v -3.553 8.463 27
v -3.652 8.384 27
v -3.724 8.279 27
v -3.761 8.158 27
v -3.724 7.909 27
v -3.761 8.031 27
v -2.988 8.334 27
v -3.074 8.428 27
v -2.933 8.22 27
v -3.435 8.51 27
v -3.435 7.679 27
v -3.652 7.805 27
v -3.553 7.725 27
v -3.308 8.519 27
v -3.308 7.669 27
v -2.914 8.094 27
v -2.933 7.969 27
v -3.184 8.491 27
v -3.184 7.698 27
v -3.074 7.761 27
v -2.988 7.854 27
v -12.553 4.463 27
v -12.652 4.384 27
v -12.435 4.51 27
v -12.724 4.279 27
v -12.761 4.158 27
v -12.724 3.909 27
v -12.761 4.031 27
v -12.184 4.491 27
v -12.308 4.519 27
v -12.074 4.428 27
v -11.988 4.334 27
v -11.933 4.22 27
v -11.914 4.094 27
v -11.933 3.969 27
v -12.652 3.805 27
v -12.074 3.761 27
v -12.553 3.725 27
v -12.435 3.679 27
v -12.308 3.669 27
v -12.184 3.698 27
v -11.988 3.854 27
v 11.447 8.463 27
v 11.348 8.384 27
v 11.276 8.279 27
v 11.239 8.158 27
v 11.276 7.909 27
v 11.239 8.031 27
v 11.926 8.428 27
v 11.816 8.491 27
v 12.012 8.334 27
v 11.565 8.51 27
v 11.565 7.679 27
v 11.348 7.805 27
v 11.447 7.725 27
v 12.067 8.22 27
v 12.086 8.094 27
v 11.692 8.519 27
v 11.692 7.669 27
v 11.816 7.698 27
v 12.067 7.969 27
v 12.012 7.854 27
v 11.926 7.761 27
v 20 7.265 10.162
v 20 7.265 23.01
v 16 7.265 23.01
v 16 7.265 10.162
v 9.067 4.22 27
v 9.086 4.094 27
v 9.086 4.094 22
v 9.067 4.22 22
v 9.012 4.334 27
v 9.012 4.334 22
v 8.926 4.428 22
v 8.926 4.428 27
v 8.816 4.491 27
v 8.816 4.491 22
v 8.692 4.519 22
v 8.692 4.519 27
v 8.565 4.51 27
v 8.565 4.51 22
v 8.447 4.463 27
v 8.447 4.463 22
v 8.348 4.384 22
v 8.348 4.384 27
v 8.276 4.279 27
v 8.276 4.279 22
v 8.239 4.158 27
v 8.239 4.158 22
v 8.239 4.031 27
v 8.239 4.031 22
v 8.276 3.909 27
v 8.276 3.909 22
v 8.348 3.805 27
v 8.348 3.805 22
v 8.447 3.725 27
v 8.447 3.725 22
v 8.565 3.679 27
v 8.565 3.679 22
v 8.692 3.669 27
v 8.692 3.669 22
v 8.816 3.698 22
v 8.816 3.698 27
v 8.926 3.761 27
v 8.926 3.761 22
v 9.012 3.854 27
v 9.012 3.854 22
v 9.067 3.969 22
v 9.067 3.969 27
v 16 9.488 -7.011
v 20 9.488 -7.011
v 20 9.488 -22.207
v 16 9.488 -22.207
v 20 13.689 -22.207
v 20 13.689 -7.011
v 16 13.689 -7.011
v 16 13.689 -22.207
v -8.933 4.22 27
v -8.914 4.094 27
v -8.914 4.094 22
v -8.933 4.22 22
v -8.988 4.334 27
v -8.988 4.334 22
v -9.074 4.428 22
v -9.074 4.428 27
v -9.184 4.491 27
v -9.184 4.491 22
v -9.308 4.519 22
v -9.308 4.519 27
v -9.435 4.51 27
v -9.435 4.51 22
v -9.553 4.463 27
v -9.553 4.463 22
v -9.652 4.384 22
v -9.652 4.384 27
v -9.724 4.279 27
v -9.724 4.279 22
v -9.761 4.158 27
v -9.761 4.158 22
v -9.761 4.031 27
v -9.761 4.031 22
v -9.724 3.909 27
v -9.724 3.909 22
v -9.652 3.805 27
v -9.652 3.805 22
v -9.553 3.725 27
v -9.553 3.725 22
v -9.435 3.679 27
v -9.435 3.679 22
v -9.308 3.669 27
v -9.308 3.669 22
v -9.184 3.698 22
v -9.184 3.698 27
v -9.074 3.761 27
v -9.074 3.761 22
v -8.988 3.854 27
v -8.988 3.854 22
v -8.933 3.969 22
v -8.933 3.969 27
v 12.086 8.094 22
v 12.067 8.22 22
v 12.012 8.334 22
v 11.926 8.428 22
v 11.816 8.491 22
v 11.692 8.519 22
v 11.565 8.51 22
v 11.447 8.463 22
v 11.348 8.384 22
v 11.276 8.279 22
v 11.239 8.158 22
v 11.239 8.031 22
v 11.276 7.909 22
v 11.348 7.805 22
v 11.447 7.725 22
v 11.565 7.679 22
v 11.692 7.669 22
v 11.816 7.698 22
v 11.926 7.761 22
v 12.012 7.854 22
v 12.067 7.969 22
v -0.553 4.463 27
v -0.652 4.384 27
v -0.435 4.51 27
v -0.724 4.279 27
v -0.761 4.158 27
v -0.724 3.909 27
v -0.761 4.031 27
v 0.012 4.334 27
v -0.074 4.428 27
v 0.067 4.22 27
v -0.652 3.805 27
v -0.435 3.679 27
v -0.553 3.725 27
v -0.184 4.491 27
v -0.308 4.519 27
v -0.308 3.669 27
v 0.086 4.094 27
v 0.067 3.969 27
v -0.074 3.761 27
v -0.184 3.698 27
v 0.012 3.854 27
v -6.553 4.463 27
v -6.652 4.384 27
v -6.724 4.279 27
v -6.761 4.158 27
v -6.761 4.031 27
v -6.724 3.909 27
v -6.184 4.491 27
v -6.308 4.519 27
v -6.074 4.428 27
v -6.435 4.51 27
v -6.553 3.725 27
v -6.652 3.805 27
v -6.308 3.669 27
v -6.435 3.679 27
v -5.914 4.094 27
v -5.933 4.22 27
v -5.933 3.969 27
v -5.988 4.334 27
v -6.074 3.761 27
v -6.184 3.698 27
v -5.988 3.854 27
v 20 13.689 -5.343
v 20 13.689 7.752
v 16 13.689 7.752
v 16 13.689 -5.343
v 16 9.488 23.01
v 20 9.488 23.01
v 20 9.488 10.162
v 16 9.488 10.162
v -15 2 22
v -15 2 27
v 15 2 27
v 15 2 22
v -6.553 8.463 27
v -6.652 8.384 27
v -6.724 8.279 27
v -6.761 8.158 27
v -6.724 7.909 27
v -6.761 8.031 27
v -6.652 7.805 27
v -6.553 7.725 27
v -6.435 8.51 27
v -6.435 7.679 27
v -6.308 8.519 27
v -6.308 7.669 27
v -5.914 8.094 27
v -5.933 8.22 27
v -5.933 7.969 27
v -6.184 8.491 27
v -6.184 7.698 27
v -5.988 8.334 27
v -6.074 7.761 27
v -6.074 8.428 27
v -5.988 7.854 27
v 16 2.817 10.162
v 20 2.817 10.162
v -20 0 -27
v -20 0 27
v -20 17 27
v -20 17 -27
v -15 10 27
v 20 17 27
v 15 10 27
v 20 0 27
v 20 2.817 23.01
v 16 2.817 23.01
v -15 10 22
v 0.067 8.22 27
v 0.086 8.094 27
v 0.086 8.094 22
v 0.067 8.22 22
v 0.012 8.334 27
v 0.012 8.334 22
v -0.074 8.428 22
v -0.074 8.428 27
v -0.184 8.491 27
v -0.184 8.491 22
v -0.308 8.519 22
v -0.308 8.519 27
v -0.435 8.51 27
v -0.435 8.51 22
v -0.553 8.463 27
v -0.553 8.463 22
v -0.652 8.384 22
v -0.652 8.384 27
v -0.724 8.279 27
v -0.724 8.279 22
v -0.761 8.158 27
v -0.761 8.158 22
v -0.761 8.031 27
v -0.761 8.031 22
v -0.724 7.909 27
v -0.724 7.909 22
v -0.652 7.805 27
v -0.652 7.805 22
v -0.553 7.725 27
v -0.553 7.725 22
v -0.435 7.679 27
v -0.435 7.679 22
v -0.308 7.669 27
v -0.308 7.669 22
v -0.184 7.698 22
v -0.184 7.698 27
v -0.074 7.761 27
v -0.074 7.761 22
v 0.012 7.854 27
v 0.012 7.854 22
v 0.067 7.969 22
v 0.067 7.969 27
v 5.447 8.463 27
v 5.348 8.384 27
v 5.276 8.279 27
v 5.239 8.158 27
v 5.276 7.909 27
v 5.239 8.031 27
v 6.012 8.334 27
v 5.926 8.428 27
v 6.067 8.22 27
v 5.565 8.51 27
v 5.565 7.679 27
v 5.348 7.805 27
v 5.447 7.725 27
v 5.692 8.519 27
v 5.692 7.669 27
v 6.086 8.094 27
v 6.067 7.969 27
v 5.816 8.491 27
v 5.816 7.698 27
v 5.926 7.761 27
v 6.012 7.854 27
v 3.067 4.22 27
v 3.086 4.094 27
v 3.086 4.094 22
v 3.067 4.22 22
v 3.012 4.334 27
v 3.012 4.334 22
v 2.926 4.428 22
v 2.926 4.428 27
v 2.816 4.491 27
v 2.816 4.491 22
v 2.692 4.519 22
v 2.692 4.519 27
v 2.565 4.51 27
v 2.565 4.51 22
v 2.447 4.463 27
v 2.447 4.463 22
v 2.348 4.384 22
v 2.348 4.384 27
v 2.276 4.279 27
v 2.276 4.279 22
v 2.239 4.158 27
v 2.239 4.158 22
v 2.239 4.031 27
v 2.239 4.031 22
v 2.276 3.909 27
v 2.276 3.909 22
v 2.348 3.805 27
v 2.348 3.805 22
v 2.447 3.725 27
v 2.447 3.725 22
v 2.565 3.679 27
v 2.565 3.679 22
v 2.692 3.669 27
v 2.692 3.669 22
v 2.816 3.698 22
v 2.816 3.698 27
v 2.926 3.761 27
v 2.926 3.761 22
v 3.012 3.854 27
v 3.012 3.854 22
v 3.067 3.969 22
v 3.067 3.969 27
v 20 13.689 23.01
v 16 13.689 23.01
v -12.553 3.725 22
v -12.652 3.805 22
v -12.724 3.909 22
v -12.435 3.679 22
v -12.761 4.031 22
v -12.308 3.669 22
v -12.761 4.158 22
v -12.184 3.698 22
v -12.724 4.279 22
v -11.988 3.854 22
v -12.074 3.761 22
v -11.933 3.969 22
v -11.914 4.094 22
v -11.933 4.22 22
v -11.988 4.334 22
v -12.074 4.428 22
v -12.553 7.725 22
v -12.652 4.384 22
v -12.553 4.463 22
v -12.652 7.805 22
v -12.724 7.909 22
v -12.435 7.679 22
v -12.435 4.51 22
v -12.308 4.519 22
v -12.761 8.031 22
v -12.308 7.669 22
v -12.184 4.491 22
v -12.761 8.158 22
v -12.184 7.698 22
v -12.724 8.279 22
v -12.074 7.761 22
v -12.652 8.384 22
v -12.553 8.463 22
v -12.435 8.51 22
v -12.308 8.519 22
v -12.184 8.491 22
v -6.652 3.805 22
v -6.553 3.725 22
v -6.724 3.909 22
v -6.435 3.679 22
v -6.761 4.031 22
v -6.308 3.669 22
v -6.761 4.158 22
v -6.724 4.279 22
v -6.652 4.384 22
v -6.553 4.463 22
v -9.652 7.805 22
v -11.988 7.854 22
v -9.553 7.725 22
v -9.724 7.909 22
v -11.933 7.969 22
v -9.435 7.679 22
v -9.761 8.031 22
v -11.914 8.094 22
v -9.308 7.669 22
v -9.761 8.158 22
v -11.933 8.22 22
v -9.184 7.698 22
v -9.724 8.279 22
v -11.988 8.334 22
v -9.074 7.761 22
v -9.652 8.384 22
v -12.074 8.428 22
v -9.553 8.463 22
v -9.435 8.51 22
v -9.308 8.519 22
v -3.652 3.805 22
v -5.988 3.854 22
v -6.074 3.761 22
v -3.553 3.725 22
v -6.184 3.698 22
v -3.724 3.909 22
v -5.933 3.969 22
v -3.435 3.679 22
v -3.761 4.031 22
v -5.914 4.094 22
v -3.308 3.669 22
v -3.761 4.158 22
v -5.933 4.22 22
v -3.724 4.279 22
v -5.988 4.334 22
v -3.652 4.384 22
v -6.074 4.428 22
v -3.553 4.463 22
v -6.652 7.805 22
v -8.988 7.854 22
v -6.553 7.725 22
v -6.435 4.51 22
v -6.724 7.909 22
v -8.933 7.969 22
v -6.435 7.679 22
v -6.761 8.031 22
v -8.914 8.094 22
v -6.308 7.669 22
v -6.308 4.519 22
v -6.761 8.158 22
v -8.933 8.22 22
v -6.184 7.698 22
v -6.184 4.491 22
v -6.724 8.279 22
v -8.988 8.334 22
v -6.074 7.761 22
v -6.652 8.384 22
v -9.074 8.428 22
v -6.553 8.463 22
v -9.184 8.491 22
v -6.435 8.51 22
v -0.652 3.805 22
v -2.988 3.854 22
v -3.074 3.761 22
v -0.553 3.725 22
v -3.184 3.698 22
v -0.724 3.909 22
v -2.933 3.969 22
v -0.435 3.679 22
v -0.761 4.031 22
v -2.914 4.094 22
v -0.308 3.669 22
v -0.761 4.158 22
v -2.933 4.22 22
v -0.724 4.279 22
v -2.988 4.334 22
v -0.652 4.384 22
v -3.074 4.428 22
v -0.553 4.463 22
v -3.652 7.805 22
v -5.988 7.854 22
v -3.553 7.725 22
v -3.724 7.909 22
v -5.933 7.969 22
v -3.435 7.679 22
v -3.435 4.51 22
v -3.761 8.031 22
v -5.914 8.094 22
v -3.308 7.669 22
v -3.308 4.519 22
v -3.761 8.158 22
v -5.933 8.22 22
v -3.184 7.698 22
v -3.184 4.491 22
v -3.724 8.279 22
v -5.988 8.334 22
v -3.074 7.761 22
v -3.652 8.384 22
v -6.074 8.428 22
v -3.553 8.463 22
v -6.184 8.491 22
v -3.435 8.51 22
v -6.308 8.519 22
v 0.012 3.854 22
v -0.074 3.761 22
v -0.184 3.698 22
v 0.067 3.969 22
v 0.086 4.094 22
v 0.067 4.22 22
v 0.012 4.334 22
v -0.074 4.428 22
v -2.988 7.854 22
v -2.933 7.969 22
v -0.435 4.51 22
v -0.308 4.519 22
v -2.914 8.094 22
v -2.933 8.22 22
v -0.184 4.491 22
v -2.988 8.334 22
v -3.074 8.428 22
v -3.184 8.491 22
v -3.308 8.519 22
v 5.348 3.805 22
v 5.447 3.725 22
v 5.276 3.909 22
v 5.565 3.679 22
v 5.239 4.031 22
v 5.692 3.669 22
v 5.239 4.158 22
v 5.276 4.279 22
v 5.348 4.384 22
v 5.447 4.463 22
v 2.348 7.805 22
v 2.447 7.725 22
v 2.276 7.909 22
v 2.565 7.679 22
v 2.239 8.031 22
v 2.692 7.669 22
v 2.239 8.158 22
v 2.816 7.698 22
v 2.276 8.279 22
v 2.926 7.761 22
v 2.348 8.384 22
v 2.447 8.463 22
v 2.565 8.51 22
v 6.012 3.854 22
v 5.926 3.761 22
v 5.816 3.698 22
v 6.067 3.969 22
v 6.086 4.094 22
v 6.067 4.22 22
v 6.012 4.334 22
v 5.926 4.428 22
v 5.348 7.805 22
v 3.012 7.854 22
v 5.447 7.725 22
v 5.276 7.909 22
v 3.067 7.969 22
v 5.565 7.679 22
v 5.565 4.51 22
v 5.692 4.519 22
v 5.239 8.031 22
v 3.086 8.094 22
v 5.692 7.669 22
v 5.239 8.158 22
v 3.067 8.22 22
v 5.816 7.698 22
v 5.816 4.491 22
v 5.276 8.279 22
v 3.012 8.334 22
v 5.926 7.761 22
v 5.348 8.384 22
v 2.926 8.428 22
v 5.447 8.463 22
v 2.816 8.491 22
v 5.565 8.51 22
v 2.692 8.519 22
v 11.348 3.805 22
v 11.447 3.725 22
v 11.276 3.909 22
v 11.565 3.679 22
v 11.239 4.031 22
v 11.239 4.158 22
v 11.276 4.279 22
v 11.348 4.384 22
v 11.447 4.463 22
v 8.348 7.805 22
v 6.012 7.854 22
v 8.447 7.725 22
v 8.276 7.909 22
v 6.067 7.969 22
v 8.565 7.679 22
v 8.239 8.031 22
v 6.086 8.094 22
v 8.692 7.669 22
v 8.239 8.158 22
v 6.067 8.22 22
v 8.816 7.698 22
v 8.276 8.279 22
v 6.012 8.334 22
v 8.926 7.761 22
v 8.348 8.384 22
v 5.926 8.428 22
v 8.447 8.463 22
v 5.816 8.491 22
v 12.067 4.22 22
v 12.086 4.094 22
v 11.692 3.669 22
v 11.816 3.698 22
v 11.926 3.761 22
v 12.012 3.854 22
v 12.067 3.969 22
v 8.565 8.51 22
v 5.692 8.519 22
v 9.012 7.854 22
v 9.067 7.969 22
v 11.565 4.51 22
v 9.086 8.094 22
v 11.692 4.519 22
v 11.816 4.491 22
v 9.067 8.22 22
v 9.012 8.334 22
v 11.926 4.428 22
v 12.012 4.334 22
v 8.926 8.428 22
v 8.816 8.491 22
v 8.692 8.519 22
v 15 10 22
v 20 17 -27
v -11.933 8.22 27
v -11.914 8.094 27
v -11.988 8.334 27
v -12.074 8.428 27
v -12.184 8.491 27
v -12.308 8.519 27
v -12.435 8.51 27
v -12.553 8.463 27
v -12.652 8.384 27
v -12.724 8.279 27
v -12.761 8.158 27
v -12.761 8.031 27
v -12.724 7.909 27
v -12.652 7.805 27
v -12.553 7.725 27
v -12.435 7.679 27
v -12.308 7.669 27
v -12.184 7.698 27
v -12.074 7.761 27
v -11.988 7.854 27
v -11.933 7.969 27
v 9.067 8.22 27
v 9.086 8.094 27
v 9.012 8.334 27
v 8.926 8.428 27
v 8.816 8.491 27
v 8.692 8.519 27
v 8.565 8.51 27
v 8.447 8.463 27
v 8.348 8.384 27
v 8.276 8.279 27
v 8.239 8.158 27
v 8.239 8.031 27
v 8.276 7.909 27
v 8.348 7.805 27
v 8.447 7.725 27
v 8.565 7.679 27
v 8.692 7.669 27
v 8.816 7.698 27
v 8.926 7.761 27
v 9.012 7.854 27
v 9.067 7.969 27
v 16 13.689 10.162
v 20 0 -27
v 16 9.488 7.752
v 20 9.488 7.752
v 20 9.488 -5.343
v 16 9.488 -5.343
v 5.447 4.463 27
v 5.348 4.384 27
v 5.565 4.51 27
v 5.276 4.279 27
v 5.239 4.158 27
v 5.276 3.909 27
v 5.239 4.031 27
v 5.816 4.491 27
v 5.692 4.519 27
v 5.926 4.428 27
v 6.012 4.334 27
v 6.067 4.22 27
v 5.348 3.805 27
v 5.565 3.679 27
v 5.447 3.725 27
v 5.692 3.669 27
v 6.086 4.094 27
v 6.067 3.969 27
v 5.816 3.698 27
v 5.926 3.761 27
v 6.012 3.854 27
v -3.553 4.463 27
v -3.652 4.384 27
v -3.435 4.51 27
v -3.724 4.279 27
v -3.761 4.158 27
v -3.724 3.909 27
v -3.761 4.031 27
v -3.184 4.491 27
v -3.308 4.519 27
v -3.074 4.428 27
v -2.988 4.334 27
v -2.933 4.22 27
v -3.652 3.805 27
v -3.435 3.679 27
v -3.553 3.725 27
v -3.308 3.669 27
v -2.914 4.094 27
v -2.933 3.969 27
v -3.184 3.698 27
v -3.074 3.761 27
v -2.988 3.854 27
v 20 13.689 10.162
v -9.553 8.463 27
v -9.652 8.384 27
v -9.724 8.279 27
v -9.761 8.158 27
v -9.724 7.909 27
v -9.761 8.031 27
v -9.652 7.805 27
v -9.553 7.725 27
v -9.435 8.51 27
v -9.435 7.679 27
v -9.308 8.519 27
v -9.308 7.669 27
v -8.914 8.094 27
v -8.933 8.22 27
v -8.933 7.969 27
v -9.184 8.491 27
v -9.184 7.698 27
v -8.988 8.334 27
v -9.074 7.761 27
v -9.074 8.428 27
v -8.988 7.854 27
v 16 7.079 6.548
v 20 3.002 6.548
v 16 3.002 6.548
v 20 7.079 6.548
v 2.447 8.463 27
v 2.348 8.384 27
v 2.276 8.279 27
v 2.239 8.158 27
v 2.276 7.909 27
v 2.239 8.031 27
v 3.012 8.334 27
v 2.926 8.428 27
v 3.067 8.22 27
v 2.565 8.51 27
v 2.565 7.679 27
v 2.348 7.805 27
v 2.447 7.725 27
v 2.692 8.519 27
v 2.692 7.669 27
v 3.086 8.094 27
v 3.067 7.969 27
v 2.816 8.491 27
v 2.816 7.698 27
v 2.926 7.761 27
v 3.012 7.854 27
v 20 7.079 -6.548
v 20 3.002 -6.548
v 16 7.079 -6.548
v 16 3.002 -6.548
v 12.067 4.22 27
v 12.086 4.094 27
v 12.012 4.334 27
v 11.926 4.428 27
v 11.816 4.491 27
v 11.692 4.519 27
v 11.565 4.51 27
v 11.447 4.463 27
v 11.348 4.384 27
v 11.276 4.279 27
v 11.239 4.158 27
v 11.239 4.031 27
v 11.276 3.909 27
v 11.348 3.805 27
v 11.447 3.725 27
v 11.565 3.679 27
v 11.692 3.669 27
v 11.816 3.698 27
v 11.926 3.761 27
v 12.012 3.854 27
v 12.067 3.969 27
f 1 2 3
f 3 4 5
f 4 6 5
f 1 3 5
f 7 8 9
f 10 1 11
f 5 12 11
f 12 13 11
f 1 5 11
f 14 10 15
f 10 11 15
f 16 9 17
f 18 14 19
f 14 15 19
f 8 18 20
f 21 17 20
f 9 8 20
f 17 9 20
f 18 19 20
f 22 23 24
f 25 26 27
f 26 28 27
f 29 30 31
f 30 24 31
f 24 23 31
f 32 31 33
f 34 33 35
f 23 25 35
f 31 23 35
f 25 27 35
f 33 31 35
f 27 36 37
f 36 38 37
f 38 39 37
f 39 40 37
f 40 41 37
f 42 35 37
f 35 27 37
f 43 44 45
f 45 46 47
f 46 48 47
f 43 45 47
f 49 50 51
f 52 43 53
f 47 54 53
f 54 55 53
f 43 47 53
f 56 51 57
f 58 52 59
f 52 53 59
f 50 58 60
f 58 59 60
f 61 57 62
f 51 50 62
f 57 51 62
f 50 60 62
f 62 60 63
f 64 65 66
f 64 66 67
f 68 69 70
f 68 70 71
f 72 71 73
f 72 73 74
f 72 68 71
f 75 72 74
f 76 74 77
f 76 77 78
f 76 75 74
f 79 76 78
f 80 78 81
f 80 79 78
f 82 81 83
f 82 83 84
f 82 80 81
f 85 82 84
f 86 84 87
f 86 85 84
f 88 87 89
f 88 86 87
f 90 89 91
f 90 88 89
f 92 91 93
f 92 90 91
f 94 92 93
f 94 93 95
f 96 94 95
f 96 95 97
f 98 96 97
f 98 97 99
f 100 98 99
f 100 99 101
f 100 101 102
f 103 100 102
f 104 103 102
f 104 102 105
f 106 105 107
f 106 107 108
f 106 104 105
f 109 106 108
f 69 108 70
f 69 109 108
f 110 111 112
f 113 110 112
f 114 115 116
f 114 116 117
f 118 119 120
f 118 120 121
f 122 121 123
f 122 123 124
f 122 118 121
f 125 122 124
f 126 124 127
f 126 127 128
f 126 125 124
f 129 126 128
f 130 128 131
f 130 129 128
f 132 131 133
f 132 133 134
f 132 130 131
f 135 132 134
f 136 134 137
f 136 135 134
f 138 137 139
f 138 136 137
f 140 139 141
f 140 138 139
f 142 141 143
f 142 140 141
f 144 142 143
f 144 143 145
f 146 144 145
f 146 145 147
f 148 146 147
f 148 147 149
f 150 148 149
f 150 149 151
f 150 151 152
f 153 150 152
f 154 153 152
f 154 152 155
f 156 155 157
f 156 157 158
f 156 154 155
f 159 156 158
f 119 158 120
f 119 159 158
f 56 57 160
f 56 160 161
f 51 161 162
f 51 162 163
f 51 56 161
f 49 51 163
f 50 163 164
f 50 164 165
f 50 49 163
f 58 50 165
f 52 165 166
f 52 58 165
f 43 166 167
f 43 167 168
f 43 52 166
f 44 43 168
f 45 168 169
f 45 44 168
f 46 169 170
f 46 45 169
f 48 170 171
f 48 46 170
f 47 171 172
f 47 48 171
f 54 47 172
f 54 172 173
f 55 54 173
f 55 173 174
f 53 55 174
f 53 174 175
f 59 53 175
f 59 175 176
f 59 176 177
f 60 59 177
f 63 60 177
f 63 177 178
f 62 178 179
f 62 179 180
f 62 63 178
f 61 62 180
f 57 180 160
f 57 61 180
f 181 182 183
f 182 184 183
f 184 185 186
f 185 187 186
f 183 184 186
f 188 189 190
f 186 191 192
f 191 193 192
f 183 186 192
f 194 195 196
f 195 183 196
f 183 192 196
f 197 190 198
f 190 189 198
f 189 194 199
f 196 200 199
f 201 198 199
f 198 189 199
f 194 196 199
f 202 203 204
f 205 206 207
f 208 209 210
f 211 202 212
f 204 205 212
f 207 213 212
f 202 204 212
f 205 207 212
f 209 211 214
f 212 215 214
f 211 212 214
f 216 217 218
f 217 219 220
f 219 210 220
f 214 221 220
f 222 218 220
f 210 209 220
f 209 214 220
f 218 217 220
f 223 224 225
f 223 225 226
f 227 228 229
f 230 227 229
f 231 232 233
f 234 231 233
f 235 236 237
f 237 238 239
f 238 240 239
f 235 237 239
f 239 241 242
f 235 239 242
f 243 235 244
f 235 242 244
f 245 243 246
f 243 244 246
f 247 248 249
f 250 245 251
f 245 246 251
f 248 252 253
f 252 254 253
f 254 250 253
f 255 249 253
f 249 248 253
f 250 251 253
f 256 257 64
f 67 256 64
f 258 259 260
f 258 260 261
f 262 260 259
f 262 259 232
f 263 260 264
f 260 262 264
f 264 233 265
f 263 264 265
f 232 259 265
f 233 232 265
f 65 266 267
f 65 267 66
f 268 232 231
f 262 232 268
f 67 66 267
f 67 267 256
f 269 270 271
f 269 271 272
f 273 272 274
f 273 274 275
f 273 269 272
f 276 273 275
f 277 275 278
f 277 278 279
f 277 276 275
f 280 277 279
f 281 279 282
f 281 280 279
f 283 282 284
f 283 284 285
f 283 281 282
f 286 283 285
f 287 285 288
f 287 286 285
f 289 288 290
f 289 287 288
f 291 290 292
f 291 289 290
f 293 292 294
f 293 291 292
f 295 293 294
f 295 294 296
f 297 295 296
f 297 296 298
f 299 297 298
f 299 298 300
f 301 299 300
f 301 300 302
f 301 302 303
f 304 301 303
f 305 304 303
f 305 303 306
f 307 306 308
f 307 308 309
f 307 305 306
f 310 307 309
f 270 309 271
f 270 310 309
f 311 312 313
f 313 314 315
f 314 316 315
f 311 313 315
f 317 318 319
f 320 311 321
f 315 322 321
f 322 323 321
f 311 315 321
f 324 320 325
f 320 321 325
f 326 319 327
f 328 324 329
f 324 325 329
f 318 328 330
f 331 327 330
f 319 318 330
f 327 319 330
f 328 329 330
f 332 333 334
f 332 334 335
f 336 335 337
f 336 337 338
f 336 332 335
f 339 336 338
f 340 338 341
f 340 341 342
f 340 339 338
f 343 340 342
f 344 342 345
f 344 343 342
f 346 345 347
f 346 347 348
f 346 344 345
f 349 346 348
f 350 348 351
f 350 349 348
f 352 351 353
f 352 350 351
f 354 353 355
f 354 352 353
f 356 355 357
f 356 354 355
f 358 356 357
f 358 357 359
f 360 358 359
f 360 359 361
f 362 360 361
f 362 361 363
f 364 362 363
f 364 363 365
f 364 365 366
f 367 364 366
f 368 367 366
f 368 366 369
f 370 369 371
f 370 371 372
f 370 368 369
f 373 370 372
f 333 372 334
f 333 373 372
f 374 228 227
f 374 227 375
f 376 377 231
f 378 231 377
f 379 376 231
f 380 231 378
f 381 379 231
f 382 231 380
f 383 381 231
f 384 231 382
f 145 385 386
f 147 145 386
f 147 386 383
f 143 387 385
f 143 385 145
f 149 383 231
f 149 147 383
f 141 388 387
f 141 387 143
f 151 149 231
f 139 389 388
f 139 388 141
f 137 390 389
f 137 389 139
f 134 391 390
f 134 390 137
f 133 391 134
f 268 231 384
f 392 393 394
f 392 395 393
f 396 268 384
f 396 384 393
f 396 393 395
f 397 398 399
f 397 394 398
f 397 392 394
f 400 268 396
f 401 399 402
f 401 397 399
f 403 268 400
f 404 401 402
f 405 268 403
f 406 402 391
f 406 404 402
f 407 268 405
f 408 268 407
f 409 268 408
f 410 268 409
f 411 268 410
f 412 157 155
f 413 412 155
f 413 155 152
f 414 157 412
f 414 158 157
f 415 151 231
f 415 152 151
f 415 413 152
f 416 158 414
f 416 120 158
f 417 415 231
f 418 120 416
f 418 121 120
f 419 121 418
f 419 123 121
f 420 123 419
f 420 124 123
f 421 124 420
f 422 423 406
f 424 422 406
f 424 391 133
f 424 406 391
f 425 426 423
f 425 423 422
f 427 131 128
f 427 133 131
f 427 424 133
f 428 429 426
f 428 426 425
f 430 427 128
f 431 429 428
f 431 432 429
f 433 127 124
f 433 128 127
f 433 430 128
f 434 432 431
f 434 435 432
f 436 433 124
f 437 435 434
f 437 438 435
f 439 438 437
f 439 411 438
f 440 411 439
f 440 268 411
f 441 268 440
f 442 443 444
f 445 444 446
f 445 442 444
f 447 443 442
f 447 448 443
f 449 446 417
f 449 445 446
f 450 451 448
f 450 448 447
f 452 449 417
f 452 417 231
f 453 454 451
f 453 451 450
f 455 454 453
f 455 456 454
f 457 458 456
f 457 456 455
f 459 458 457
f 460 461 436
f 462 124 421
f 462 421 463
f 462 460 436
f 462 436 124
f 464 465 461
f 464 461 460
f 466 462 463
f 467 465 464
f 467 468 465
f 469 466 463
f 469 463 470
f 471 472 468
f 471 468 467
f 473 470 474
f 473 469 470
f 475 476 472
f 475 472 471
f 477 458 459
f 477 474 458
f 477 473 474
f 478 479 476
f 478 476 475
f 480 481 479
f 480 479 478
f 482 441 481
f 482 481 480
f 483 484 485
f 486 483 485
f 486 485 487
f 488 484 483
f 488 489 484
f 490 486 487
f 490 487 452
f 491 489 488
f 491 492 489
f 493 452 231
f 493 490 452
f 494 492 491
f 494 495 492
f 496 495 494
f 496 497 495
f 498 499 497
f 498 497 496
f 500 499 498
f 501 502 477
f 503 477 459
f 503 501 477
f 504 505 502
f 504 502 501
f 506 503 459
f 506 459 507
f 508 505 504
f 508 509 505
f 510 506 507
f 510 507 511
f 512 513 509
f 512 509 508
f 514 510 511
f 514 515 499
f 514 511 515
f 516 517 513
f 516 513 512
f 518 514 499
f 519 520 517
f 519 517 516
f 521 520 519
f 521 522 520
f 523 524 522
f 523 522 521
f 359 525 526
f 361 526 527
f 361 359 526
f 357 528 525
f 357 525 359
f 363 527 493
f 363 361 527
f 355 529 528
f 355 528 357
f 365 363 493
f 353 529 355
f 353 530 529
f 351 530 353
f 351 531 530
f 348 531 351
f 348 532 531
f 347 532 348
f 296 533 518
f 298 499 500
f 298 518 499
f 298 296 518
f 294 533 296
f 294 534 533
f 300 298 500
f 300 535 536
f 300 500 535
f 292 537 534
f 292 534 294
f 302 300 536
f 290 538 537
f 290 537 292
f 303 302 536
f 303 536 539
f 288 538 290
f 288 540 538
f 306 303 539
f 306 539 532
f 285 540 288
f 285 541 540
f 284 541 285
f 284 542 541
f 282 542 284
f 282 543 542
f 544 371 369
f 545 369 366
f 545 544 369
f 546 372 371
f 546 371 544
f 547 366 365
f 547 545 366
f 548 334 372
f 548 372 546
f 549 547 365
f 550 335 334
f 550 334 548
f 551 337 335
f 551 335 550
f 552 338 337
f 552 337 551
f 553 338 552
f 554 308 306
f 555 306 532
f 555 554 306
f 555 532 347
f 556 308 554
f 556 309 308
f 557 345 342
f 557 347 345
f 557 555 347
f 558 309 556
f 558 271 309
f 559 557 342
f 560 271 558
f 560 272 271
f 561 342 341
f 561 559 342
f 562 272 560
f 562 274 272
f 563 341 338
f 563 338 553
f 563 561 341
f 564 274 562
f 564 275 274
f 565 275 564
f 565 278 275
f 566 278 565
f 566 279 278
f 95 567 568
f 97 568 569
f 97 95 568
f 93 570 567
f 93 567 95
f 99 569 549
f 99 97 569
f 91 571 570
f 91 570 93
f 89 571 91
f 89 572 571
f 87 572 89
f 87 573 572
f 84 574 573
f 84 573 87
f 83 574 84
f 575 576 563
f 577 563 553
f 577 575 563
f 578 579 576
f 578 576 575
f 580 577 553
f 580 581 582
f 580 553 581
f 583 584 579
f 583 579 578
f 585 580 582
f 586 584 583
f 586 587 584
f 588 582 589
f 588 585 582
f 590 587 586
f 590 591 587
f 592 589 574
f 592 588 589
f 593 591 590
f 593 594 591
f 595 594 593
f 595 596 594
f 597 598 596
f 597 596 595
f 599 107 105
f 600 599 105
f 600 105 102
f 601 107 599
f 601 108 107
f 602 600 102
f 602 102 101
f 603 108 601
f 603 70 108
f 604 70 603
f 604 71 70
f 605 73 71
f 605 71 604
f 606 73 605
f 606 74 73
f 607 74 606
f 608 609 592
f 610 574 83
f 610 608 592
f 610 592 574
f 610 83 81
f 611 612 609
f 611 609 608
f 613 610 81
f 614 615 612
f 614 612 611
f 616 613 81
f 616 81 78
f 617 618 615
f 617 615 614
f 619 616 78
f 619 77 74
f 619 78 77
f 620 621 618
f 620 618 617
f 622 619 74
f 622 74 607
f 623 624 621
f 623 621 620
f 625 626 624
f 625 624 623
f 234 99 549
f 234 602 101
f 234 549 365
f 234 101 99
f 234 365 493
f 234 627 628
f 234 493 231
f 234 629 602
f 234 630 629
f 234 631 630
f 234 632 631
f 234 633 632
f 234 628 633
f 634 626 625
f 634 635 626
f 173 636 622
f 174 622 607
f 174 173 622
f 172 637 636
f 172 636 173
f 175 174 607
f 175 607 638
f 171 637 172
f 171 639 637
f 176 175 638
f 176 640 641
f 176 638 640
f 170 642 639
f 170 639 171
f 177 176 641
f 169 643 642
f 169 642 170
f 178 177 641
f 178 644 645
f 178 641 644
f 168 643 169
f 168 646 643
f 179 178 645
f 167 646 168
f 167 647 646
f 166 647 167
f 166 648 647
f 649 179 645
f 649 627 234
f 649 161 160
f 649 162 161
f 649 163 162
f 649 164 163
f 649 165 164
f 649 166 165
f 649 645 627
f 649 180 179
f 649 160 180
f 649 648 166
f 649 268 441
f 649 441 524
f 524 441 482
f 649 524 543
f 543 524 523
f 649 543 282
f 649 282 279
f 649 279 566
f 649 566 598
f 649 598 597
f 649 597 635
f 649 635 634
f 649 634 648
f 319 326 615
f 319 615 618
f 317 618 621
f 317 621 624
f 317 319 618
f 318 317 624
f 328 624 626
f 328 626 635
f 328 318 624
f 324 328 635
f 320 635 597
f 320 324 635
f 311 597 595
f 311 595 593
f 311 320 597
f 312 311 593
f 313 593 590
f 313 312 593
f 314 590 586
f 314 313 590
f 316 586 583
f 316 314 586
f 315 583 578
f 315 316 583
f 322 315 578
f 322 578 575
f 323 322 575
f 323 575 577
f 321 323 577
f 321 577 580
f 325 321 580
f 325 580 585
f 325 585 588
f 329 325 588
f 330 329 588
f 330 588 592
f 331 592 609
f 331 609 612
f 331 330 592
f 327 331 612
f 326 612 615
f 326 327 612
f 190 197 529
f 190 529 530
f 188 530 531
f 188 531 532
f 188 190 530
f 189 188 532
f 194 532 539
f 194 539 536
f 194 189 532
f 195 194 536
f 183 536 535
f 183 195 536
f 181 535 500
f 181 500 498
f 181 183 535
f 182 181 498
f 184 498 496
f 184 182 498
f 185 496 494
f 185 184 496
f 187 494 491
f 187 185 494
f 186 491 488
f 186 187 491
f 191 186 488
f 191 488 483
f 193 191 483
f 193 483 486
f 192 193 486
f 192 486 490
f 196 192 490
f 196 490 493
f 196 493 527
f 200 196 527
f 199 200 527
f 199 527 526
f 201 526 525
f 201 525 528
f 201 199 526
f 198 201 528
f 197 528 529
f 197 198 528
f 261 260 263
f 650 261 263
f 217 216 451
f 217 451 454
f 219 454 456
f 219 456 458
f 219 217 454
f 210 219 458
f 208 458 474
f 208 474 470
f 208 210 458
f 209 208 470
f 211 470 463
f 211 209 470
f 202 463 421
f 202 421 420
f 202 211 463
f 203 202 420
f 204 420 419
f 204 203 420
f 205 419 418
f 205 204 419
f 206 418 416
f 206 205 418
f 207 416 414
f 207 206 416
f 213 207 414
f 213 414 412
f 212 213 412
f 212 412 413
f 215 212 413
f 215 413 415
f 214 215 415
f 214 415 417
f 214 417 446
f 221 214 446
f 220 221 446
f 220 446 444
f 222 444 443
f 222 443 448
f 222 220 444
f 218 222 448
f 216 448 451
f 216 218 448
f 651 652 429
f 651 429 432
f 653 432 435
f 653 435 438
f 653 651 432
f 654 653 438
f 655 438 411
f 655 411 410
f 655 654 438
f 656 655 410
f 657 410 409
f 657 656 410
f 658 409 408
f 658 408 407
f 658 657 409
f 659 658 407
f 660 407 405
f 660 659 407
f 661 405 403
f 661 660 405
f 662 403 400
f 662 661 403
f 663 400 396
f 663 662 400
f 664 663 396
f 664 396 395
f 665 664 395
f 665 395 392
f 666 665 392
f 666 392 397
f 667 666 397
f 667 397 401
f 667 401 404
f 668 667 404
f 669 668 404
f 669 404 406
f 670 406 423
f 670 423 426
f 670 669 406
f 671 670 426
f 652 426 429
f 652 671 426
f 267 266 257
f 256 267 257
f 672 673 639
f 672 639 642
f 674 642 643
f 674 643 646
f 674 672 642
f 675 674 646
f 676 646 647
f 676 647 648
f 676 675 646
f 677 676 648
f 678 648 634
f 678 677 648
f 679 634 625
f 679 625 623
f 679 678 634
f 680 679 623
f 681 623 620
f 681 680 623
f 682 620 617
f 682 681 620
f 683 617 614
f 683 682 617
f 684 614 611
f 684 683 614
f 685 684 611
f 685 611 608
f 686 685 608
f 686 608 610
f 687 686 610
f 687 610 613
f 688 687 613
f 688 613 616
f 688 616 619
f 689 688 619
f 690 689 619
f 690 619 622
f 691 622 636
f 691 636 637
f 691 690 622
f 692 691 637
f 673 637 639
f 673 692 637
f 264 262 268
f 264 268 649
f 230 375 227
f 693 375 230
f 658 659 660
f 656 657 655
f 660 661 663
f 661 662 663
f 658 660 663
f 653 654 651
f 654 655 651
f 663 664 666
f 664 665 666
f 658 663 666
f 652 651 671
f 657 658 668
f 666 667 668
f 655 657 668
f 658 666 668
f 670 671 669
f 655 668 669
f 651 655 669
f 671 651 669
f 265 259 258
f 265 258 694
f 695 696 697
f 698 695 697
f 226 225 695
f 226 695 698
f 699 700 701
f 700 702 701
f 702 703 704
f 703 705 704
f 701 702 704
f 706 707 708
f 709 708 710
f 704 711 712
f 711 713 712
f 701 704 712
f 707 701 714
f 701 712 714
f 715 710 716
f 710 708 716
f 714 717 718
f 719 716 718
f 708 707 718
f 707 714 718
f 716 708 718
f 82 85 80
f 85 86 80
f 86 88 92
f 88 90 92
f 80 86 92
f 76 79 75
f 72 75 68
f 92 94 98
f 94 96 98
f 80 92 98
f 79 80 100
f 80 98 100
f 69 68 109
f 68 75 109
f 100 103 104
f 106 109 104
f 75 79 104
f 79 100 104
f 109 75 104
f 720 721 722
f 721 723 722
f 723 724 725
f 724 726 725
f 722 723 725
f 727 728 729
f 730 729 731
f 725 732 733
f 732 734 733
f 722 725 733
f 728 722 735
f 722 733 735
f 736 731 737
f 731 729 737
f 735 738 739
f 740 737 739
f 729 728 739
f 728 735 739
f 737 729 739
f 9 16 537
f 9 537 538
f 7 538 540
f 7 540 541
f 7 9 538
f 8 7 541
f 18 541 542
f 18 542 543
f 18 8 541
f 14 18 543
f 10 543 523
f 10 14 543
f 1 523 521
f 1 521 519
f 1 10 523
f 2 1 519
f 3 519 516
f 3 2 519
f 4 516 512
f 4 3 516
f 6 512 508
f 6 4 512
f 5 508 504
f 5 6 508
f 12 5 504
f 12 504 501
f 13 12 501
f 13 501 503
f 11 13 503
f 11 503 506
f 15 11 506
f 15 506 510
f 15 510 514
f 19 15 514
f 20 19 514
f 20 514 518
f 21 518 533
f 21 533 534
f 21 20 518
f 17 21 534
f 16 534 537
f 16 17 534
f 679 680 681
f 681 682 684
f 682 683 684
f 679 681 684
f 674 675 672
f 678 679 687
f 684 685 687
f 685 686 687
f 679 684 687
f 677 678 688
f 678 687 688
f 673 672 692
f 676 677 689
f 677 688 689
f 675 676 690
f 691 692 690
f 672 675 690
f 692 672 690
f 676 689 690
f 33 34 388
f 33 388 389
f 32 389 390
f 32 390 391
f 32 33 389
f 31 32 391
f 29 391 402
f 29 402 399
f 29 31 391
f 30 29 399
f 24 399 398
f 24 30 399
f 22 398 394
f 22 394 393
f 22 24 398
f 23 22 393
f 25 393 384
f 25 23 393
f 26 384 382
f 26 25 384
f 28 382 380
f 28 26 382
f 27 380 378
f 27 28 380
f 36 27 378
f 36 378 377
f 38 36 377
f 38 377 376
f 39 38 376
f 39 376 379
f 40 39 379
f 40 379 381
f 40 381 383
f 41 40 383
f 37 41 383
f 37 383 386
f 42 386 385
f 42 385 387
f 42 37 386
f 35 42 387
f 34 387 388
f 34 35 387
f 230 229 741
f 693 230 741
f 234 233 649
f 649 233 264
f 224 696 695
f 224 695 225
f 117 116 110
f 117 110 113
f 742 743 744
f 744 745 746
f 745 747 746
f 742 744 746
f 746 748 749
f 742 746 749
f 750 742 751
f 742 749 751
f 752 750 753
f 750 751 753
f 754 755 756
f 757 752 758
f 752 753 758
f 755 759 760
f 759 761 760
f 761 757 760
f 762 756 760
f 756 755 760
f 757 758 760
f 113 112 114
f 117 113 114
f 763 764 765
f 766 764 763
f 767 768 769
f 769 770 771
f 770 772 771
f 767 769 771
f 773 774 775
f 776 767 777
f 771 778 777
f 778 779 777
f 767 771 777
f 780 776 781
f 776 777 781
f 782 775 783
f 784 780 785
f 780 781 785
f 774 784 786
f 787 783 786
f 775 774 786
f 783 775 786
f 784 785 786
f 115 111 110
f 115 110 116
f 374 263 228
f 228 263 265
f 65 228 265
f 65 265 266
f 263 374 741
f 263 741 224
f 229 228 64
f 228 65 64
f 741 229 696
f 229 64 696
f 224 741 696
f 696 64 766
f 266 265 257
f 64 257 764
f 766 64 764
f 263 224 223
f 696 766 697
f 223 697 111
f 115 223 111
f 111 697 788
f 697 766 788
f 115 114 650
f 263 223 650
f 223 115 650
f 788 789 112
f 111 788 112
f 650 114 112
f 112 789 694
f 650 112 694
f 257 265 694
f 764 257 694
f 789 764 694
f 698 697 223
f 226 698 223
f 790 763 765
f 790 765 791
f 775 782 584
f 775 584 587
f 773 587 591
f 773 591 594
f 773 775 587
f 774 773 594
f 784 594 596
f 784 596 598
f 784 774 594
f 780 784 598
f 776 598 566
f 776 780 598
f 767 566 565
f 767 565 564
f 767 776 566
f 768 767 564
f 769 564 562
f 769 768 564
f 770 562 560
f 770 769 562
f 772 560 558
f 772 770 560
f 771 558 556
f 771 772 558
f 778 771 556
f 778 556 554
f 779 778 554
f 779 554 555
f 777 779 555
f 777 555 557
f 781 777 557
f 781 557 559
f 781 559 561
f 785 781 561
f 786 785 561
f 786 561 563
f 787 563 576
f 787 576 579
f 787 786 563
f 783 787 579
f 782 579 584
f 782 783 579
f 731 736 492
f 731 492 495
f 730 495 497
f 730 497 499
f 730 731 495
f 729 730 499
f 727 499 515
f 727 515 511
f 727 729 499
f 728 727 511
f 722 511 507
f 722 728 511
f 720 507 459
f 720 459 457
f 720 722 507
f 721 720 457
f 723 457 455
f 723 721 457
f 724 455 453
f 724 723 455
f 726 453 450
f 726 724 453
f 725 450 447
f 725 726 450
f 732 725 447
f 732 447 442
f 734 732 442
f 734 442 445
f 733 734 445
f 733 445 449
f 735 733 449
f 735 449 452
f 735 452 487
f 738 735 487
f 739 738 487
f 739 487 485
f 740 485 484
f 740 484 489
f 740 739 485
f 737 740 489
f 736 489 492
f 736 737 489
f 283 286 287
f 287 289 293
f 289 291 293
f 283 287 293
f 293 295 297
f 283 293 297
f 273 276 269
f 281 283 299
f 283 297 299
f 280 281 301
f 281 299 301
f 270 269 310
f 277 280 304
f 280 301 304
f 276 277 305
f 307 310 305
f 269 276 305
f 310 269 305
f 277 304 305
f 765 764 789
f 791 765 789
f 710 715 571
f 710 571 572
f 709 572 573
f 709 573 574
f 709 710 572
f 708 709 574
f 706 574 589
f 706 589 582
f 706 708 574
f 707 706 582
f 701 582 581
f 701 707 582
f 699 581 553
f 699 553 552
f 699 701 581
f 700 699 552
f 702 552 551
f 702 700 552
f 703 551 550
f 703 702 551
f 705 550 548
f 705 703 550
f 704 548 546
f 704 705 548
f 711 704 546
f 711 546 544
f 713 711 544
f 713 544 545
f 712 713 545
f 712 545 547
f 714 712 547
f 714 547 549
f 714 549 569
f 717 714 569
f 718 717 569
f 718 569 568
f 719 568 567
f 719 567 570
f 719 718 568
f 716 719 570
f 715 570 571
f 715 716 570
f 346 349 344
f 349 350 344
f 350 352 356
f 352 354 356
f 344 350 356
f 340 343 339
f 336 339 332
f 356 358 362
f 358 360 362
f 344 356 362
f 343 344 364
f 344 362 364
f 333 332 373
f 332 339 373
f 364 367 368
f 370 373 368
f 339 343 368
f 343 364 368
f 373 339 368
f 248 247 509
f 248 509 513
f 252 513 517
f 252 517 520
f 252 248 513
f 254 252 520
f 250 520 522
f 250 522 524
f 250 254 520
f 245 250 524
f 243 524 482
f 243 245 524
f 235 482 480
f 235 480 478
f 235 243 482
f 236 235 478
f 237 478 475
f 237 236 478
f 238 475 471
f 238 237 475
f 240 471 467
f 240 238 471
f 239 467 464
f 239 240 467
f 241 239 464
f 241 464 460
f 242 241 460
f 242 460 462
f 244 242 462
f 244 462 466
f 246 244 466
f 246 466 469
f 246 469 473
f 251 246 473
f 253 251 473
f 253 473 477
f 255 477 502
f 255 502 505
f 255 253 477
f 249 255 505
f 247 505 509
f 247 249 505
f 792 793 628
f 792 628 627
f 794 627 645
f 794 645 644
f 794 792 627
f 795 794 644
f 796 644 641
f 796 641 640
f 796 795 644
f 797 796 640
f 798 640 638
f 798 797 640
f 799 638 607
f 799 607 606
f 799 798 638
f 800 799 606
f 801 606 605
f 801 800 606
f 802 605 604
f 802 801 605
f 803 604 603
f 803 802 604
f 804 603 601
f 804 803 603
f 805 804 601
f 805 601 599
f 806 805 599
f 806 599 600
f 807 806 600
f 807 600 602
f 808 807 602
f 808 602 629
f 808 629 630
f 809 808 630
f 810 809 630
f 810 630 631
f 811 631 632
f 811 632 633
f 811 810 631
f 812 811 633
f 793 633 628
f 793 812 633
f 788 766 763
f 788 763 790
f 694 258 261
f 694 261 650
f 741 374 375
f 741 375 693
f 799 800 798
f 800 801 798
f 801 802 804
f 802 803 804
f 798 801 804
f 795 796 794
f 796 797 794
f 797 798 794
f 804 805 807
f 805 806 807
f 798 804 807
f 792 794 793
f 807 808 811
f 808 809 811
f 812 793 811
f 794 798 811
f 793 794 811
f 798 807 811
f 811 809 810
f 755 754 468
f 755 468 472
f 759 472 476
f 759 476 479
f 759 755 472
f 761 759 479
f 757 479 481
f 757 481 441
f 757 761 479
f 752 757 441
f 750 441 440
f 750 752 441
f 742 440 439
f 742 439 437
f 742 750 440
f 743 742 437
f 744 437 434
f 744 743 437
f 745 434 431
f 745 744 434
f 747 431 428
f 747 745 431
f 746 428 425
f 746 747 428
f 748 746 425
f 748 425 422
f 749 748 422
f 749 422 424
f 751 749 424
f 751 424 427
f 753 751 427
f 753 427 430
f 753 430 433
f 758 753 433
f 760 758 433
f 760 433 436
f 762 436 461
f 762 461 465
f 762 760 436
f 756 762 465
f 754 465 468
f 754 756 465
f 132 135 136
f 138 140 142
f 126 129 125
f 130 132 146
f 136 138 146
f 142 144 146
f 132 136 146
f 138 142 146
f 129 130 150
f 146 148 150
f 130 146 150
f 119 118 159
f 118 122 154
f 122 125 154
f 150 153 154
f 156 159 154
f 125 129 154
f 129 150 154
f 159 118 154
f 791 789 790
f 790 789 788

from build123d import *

# Parameters (mm, degrees)
SKETCH1_W           = 40
SKETCH1_H           = 54
BOSS_EXTRUDE1_DEPTH = 17
SKETCH2_W           = 30
SKETCH2_H           = 8
SKETCH2_R           = 0.426133687
CUT_EXTRUDE1_DEPTH  = 5
SKETCH3_W           = 12.848601187
SKETCH3_H           = 4.200504235
SKETCH3_W_2         = 13.095689671
SKETCH3_W_3         = 15.195941788
SKETCH3_H_2         = 4.447592718
SKETCH3_W_4         = 13.095689672
SKETCH3_H_3         = 4.076959992
CUT_EXTRUDE2_DEPTH  = 4


with BuildPart() as part:
    # Sketch1 → Boss-Extrude1 (new body)
    with BuildSketch(Plane(origin=(0, 0, 0), x_dir=(1, 0, 0), z_dir=(0, 1, 0))):
        Rectangle(SKETCH1_W, SKETCH1_H)
    extrude(amount=BOSS_EXTRUDE1_DEPTH)

    # Sketch2 → Cut-Extrude1 (cut)
    with BuildSketch(Plane.XY.offset(27)):
        with Locations((0, 6)):
            Rectangle(SKETCH2_W, SKETCH2_H)
        with Locations((-12.339715026, 8.094368166)):
            Circle(SKETCH2_R, mode=Mode.SUBTRACT)
        with Locations((-9.339715026, 8.094368166)):
            Circle(SKETCH2_R, mode=Mode.SUBTRACT)
        with Locations((-6.339715026, 8.094368166)):
            Circle(SKETCH2_R, mode=Mode.SUBTRACT)
        with Locations((-3.339715026, 8.094368166)):
            Circle(SKETCH2_R, mode=Mode.SUBTRACT)
        with Locations((-0.339715026, 8.094368166)):
            Circle(SKETCH2_R, mode=Mode.SUBTRACT)
        with Locations((2.660284974, 8.094368166)):
            Circle(SKETCH2_R, mode=Mode.SUBTRACT)
        with Locations((5.660284974, 8.094368166)):
            Circle(SKETCH2_R, mode=Mode.SUBTRACT)
        with Locations((8.660284974, 8.094368166)):
            Circle(SKETCH2_R, mode=Mode.SUBTRACT)
        with Locations((11.660284974, 8.094368166)):
            Circle(SKETCH2_R, mode=Mode.SUBTRACT)
        with Locations((-9.339715026, 4.094368166)):
            Circle(SKETCH2_R, mode=Mode.SUBTRACT)
        with Locations((-6.339715026, 4.094368166)):
            Circle(SKETCH2_R, mode=Mode.SUBTRACT)
        with Locations((-3.339715026, 4.094368166)):
            Circle(SKETCH2_R, mode=Mode.SUBTRACT)
        with Locations((-0.339715026, 4.094368166)):
            Circle(SKETCH2_R, mode=Mode.SUBTRACT)
        with Locations((2.660284974, 4.094368166)):
            Circle(SKETCH2_R, mode=Mode.SUBTRACT)
        with Locations((5.660284974, 4.094368166)):
            Circle(SKETCH2_R, mode=Mode.SUBTRACT)
        with Locations((8.660284974, 4.094368166)):
            Circle(SKETCH2_R, mode=Mode.SUBTRACT)
        with Locations((11.660284974, 4.094368166)):
            Circle(SKETCH2_R, mode=Mode.SUBTRACT)
        with Locations((-12.339715026, 4.094368166)):
            Circle(SKETCH2_R, mode=Mode.SUBTRACT)
    extrude(amount=-CUT_EXTRUDE1_DEPTH, mode=Mode.SUBTRACT)

    # Sketch3 → Cut-Extrude2 (cut)
    with BuildSketch(Plane(origin=(20, 0, 0), x_dir=(0, 0, -1), z_dir=(1, 0, 0))):
        with Locations((-16.585814513, 11.588606055)):
            Rectangle(SKETCH3_W, SKETCH3_H)
        with Locations((-1.204556361, 11.588606055)):
            Rectangle(SKETCH3_W_2, SKETCH3_H)
        with Locations((14.609106638, 11.588606055)):
            Rectangle(SKETCH3_W_3, SKETCH3_H)
        with Locations((-16.585814513, 5.040761219)):
            Rectangle(SKETCH3_W, SKETCH3_H_2)
        with Locations((0, 5.040761219)):
            Rectangle(SKETCH3_W_4, SKETCH3_H_3)
    extrude(amount=-CUT_EXTRUDE2_DEPTH, mode=Mode.SUBTRACT)


solid = part.part
